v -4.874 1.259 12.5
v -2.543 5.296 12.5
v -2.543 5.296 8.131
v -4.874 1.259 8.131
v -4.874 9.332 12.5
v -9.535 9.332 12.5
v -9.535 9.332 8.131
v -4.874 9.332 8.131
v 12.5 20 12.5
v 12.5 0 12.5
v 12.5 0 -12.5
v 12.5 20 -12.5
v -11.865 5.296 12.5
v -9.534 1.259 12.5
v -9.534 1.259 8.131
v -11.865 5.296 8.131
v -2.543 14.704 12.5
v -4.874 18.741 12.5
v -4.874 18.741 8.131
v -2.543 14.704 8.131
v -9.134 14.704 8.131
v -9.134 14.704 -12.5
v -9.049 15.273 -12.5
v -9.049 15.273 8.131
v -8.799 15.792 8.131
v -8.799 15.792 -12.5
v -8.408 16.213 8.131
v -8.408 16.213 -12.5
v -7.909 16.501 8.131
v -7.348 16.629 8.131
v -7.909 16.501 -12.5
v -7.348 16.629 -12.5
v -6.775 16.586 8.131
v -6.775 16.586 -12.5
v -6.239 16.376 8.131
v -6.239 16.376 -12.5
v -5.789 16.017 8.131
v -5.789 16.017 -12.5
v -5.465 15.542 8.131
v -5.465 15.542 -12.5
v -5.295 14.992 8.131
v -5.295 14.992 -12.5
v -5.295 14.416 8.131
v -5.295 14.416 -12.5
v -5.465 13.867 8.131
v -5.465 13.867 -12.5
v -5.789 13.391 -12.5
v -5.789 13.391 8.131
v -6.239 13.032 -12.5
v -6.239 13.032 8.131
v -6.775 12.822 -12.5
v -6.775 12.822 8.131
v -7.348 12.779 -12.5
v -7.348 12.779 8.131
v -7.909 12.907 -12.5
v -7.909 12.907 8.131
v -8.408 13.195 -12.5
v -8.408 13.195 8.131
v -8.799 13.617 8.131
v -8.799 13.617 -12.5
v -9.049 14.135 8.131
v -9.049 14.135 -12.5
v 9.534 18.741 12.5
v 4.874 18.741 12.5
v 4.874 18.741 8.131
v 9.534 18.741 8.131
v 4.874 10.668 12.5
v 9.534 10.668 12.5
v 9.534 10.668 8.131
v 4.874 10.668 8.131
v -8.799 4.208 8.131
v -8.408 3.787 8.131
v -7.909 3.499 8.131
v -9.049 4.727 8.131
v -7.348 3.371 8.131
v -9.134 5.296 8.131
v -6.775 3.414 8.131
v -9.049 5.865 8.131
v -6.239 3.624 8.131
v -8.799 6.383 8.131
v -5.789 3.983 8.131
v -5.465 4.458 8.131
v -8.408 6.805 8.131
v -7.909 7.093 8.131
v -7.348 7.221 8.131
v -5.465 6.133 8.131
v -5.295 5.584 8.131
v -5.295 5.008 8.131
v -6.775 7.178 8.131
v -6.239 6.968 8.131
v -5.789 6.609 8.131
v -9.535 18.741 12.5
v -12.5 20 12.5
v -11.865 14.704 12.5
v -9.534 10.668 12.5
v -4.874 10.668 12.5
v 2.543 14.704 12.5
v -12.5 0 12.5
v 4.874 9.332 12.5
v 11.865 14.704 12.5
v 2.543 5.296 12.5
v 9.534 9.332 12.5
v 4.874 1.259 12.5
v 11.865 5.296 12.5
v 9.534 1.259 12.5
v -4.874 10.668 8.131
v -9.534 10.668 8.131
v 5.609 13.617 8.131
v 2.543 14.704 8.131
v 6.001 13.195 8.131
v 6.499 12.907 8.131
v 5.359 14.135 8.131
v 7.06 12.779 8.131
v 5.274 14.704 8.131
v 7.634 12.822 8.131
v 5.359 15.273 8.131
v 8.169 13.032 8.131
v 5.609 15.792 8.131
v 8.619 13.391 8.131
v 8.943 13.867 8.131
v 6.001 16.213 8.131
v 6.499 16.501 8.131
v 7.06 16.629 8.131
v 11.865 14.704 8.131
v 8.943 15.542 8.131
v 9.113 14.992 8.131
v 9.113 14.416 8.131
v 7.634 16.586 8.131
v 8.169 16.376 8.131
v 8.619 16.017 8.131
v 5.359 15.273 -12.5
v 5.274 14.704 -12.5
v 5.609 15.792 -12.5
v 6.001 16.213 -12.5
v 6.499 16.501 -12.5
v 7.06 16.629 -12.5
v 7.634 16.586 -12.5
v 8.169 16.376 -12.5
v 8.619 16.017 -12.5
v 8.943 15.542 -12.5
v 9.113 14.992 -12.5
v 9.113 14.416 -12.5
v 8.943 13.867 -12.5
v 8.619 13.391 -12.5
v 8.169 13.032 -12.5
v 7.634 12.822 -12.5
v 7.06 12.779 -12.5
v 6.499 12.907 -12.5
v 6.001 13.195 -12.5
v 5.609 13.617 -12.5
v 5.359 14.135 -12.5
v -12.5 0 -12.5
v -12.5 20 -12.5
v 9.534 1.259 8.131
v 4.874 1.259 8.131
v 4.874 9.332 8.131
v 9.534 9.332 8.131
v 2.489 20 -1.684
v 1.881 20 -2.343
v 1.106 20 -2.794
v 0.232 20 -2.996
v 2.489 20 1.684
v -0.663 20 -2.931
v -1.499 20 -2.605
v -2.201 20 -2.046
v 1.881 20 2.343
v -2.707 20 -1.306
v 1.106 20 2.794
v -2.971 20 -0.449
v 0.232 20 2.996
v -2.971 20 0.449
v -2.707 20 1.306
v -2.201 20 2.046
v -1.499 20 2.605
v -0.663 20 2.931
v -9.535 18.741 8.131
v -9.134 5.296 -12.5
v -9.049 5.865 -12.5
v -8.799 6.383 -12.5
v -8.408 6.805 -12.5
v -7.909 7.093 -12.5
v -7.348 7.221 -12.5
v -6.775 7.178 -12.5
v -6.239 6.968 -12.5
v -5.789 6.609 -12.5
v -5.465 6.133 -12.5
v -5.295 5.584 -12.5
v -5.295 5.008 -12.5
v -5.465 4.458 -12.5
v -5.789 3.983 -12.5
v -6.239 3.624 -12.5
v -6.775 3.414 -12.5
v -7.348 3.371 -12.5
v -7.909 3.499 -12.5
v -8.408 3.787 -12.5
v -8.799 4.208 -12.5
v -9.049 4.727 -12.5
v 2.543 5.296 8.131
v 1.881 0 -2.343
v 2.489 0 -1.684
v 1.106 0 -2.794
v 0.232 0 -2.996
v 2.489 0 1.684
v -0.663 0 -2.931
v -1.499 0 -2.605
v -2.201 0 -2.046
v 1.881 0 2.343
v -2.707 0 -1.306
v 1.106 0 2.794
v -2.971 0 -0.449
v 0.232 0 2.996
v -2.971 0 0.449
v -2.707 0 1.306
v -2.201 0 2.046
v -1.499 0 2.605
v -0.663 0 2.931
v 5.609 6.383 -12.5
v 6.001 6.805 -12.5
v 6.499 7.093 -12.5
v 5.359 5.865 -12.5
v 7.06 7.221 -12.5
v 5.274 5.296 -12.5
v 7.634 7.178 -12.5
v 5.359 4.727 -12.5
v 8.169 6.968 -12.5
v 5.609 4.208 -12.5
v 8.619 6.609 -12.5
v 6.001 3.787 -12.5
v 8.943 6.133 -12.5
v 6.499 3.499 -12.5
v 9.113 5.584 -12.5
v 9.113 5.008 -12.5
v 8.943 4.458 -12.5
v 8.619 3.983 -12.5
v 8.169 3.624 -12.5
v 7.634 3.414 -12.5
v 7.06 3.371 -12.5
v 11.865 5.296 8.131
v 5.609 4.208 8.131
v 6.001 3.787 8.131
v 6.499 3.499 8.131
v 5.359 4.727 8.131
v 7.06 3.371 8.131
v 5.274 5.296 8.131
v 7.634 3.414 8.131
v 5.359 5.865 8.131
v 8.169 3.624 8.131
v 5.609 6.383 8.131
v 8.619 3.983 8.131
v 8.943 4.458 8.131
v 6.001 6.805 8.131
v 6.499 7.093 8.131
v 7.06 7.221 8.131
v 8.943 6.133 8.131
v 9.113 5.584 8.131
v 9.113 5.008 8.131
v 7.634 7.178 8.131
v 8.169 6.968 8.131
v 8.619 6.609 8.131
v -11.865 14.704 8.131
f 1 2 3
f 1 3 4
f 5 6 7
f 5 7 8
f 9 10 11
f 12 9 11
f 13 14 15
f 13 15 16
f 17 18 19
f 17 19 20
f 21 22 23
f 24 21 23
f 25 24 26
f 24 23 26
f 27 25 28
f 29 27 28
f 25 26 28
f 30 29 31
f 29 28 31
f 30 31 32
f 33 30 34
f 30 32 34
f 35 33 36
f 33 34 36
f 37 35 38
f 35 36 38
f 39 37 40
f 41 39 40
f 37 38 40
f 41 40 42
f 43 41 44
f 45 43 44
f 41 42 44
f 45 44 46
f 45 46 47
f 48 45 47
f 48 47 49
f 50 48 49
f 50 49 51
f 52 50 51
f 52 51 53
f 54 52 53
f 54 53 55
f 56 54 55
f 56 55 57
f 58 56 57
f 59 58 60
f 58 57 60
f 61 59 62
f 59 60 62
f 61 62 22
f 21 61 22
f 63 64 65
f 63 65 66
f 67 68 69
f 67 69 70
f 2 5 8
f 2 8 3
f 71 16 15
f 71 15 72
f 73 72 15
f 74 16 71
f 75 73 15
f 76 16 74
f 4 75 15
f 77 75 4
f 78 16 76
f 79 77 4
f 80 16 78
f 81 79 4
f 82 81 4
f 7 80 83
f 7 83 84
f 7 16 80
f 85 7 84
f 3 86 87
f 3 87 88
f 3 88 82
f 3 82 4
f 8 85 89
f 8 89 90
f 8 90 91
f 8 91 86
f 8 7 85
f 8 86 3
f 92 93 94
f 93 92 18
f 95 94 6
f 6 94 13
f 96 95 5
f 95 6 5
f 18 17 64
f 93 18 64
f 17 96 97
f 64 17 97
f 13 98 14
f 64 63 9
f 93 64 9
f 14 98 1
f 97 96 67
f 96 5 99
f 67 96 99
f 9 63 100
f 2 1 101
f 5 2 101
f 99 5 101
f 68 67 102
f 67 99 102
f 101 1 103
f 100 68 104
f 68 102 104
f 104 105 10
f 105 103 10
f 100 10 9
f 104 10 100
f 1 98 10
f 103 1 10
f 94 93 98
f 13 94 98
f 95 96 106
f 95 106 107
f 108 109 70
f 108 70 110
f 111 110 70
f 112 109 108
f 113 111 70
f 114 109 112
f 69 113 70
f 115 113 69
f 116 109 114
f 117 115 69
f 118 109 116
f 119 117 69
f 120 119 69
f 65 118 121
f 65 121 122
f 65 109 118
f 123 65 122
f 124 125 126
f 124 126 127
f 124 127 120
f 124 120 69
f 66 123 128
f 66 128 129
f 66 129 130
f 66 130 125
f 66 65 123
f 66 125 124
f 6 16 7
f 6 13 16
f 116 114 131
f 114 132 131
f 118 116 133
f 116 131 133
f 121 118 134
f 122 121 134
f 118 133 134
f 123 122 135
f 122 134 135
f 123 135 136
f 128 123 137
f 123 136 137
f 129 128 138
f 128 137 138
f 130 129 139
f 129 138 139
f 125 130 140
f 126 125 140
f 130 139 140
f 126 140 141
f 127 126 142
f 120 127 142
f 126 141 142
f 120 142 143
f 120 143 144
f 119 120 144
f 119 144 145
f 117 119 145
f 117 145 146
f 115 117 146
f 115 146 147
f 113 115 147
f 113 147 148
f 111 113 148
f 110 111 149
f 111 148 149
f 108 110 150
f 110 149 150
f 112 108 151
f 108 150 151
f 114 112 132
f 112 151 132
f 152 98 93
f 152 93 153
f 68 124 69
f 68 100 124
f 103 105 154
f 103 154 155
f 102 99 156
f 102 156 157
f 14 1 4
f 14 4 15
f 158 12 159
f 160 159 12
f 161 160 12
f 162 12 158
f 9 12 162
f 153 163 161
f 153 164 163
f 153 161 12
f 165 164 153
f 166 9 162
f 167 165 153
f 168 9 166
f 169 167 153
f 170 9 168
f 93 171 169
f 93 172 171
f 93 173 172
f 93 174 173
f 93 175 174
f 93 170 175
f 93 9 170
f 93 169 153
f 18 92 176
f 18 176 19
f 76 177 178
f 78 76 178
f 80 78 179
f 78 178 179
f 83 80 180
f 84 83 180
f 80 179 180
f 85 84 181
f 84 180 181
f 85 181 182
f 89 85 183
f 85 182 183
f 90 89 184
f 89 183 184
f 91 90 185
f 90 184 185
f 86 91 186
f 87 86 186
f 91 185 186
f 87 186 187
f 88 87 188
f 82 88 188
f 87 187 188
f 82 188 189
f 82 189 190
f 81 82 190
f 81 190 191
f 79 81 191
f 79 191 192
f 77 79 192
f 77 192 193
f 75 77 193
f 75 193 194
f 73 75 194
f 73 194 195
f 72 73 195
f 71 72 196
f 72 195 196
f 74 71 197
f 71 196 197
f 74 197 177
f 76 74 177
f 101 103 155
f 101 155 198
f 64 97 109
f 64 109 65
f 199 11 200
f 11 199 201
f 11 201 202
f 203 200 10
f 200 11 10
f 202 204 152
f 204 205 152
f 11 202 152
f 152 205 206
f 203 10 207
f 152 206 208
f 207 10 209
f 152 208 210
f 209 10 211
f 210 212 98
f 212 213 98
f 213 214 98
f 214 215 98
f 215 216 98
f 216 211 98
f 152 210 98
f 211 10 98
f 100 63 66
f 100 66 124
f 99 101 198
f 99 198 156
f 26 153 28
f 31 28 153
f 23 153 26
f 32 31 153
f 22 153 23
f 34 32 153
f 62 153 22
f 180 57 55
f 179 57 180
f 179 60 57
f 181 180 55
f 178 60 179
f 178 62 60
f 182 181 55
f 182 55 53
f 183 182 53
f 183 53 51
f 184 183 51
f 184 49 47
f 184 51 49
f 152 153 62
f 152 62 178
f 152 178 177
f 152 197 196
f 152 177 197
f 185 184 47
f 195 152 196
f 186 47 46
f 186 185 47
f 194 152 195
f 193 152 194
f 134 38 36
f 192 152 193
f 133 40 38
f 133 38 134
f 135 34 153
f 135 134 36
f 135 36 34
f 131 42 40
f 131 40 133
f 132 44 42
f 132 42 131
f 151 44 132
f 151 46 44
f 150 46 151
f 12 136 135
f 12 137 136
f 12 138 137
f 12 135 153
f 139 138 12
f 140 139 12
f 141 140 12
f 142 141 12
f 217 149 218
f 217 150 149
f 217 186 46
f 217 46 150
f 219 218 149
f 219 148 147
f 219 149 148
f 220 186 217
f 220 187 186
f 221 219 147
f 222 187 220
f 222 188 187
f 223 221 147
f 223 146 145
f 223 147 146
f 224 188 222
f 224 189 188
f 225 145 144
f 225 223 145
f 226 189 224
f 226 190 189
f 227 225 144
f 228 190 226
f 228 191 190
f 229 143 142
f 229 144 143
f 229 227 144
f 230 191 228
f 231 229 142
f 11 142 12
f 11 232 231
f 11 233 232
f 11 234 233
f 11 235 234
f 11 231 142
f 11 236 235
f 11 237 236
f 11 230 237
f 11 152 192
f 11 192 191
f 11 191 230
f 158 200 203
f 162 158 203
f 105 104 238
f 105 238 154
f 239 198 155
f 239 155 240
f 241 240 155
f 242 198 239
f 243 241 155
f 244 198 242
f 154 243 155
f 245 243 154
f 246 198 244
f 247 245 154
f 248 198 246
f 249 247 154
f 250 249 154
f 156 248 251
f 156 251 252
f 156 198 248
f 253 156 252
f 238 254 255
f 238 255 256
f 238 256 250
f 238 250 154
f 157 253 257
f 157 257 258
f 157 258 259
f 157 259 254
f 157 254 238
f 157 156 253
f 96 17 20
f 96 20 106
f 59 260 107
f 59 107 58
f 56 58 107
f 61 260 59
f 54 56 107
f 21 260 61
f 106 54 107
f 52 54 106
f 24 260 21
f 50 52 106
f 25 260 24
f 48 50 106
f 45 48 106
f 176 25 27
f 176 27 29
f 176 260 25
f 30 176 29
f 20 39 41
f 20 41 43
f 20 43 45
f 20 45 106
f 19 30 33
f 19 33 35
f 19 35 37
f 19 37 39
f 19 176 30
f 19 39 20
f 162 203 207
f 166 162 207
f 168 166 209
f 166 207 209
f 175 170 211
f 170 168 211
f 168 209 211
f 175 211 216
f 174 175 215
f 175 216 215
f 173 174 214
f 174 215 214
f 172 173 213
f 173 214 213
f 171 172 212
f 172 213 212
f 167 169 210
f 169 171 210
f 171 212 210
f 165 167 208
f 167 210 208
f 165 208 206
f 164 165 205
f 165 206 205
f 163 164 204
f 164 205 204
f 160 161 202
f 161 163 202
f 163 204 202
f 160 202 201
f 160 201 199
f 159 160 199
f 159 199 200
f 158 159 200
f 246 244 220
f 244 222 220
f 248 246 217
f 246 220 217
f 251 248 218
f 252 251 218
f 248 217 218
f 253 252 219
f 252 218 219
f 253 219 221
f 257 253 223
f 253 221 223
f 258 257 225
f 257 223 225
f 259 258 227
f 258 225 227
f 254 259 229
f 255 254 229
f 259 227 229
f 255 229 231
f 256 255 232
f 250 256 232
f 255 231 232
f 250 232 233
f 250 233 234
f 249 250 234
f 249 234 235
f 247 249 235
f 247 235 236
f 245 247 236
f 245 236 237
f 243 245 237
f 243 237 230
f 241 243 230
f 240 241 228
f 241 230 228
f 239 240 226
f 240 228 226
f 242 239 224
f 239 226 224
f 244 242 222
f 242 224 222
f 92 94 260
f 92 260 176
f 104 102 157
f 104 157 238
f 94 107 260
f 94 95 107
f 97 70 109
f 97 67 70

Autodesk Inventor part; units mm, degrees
ref_plane "YZ Plane" through (0, 0, 0) normal (1, 0, 0) x (0, 1, 0)
ref_plane "XZ Plane" through (0, 0, 0) normal (0, 1, 0) x (-1, 0, 0)
ref_plane "XY Plane" through (0, 0, 0) normal (0, 0, 1) x (1, 0, 0)
sketch "Sketch1" plane through (0, 0, 0) normal (0, 1, 0) x (-1, 0, 0)
  line L0 (12.5, 12.5) -> (12.5, -12.5)
  line L1 (12.5, -12.5) -> (-12.5, -12.5)
  line L2 (12.5, 12.5) -> (-12.5, 12.5)
  line L3 (-12.5, 12.5) -> (-12.5, -12.5)
  arc A0 (-2.489, -1.6837) -> (-2.489, 1.6837) centre (0, 0) ccw
  line L4 (-2.489, -1.6837) -> (-2.489, 1.6837)
  dimension "d8" = 12.5
  dimension "d9" = 25
  dimension "d10" = 12.5
  dimension "d11" = 25
  dimension "d12" = 6.01
  dimension "d13" = 2.489
extrude "Extrusion1" add sketch "Sketch1" along normal blind 20
sketch "Sketch2" plane through (-12.5, 0, 12.5) normal (0, 0, 1) x (1, 0, 0)
  circle A0 centre (5.2959, 14.7041) radius 4.6609 construction
  circle A1 centre (5.2959, 5.2959) radius 4.6609 construction
  circle A2 centre (19.7041, 14.7041) radius 4.6609 construction
  circle A3 centre (19.7041, 5.2959) radius 4.6609 construction
  line L0 (0, 0) -> (0, 20) projected
  line L1 (25, 0) -> (25, 20) projected
  line L2 (0, 20) -> (25, 20) projected
  line L3 (0, 0) -> (25, 0) projected
  line L4 (5.2959, 14.7041) -> (19.7041, 14.7041) construction
  line L5 (5.2959, 5.2959) -> (19.7041, 5.2959) construction
  line L6 (24.365, 14.7041) -> (22.0345, 10.6676)
  line L7 (22.0345, 10.6676) -> (17.3737, 10.6676)
  line L8 (17.3737, 10.6676) -> (15.0432, 14.7041)
  line L9 (15.0432, 14.7041) -> (17.3737, 18.7406)
  line L10 (17.3737, 18.7406) -> (22.0345, 18.7406)
  line L11 (22.0345, 18.7406) -> (24.365, 14.7041)
  line L12 (24.365, 5.2959) -> (22.0345, 1.2594)
  line L13 (22.0345, 1.2594) -> (17.3737, 1.2594)
  line L14 (17.3737, 1.2594) -> (15.0432, 5.2959)
  line L15 (15.0432, 5.2959) -> (17.3737, 9.3324)
  line L16 (17.3737, 9.3324) -> (22.0345, 9.3324)
  line L17 (22.0345, 9.3324) -> (24.365, 5.2959)
  line L18 (9.9568, 5.2959) -> (7.6264, 1.2594)
  line L19 (7.6264, 1.2594) -> (2.9655, 1.2594)
  line L20 (2.9655, 1.2594) -> (0.635, 5.2959)
  line L21 (0.635, 5.2959) -> (2.9654, 9.3324)
  line L22 (2.9654, 9.3324) -> (7.6263, 9.3324)
  line L23 (7.6263, 9.3324) -> (9.9568, 5.2959)
  line L24 (9.9568, 14.7041) -> (7.6264, 10.6676)
  line L25 (7.6264, 10.6676) -> (2.9655, 10.6676)
  line L26 (2.9655, 10.6676) -> (0.635, 14.7041)
  line L27 (0.635, 14.7041) -> (2.9654, 18.7406)
  line L28 (2.9654, 18.7406) -> (7.6263, 18.7406)
  line L29 (7.6263, 18.7406) -> (9.9568, 14.7041)
  point P0 (12.5, 0)
  dimension "d16" = 9.3218
  dimension "d17" = 9.3218
  dimension "d18" = 9.3218
  dimension "d19" = 9.3218
  dimension "d20" = 5.2959
  dimension "d21" = 5.2959
  dimension "d22" = 5.2959
  dimension "d23" = 5.2959
  dimension "d24" = 5.2959
  dimension "d25" = 5.2959
  dimension "d26" = 5.2959
  dimension "d27" = 5.2959
sketch "Sketch3" plane through (12.5, 0, -12.5) normal (0, 0, -1) x (-1, 0, 0)
  circle A0 centre (5.2959, 14.7041) radius 1.9304
  line L0 (0, 20) -> (25, 20) projected
  line L1 (0, 0) -> (0, 20) projected
  circle A1 centre (5.2959, 5.2959) radius 1.9304
  line L2 (0, 0) -> (25, 0) projected
  circle A2 centre (19.7041, 14.7041) radius 1.9304
  line L3 (25, 0) -> (25, 20) projected
  circle A3 centre (19.7041, 5.2959) radius 1.9304
  point P0 (12.5, 0)
  dimension "d28" = 3.8608
  dimension "d29" = 5.2959
  dimension "d30" = 5.2959
  dimension "d31" = 3.8608
  dimension "d32" = 5.2959
  dimension "d33" = 5.2959
  dimension "d34" = 3.8608
  dimension "d35" = 5.2959
  dimension "d36" = 5.2959
  dimension "d37" = 3.8608
  dimension "d38" = 5.2959
  dimension "d39" = 5.2959
extrude "6-32Holes" cut sketch "Sketch3" against normal through all contours A0 | A1 | A2 | A3
extrude "NutWells" cut sketch "Sketch2" against normal blind 4.3688 contours L6 L7 L8 L9 L10 L11 | L12 L13 L14 L15 L16 L17 | L18 L19 L20 L21 L22 L23 | L24 L25 L26 L27 L28 L29
equation "\"d8\" = 0.5 * d9"
equation "\"d10\" = 0.5 * d11"
equation "\"d20\" = d21"
equation "\"d22\" = d23"
equation "\"d24\" = d23"
equation "\"d25\" = d23"
equation "\"d26\" = d21"
equation "\"d27\" = d21"
equation "\"d29\" = d23"
equation "\"d30\" = d21"
equation "\"d31\" = d28"
equation "\"d32\" = d23"
equation "\"d33\" = d21"
equation "\"d34\" = d28"
equation "\"d35\" = d21"
equation "\"d36\" = d23"
equation "\"d37\" = d28"
equation "\"d38\" = d23"
equation "\"d39\" = d21"
properties part number "615456 bevel gear lock A"
